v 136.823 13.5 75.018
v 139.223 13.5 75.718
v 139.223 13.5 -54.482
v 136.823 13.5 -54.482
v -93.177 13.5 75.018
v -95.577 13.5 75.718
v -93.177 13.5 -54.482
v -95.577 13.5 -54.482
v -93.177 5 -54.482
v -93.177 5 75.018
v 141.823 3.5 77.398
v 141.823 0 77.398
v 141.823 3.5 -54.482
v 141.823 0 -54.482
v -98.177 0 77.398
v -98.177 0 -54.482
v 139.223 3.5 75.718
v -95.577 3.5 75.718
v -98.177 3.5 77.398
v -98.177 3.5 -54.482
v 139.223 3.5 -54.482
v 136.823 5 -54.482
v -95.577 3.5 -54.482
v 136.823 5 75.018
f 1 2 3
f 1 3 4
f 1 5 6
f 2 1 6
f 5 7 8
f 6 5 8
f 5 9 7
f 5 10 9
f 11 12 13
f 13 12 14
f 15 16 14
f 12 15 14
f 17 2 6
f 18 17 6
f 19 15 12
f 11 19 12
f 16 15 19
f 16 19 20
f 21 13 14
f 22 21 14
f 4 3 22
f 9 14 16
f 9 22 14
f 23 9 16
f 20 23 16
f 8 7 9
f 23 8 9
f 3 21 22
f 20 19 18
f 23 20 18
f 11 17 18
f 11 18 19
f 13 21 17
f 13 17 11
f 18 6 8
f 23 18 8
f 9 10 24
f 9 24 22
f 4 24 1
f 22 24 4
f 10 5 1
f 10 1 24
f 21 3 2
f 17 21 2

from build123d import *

# Parameters (mm, degrees)
SKETCH1_W           = 240
SKETCH1_H           = 351.15
BOSS_EXTRUDE3_DEPTH = 21
SKETCH5_W           = 248.975913499
SKETCH5_H           = 113.170869772
CUT_EXTRUDE5_DEPTH  = 254
CAVITY1_START       = -93.176553254
CAVITY1_DEPTH       = 230
SKETCH6_W           = 230
SKETCH6_H           = 2.384694545
CUT_EXTRUDE6_DEPTH  = 10
SKETCH7_W           = 329.692379319
SKETCH7_H           = 158.801284786
CUT_EXTRUDE8_DEPTH  = 33
CUT_EXTRUDE9_DEPTH  = 10


with BuildPart() as part:
    # Sketch1 → Boss-Extrude3 (new body)
    with BuildSketch(Plane(origin=(0, 0, 0), x_dir=(1, 0, 0), z_dir=(0, 1, 0))):
        with Locations((21.823446746, 98.176553254)):
            Rectangle(SKETCH1_W, SKETCH1_H)
    extrude(amount=BOSS_EXTRUDE3_DEPTH)

    # Sketch5 → Cut-Extrude5 (cut)
    with BuildSketch(Plane(origin=(0, 0, -54.481553254), x_dir=(-1, 0, 0), z_dir=(0, 0, -1))):
        with Locations((-20.8478358, 4.110963623)):
            Rectangle(SKETCH5_W, SKETCH5_H)
    extrude(amount=CUT_EXTRUDE5_DEPTH, mode=Mode.SUBTRACT)

    # Cavity1: read off the stored shape, not the designer's step
    # Cavity1 outline → Cavity1 (cut)
    with BuildSketch(Plane.YZ.offset(CAVITY1_START)):
        Polygon((18.5, 60.403141291), (13.5, 67.518446746), (13.5, 67.903141291), (18.5, 67.903141291), (13.5, 75.018446746), (5, 75.018446746), (5, -54.481553254), (13.5, -54.481553254), (13.5, -52.096858709), (18.5, -52.096858709), (13.5, -44.981553254), (13.5, -44.596858709), (18.5, -44.596858709), (13.5, -37.481553254), (13.5, -37.096858709), (18.5, -37.096858709), (13.5, -29.981553254), (13.5, -29.596858709), (18.5, -29.596858709), (13.5, -22.481553254), (13.5, -22.096858709), (18.5, -22.096858709), (13.5, -14.981553254), (13.5, -14.596858709), (18.5, -14.596858709), (13.5, -7.481553254), (13.5, -7.096858709), (18.5, -7.096858709), (13.5, 0.018446746), (13.5, 0.403141291), (18.5, 0.403141291), (13.5, 7.518446746), (13.5, 7.903141291), (18.5, 7.903141291), (13.5, 15.018446746), (13.5, 15.403141291), (18.5, 15.403141291), (13.5, 22.518446746), (13.5, 22.903141291), (18.5, 22.903141291), (13.5, 30.018446746), (13.5, 30.403141291), (18.5, 30.403141291), (13.5, 37.518446746), (13.5, 37.903141291), (18.5, 37.903141291), (13.5, 45.018446746), (13.5, 45.403141291), (18.5, 45.403141291), (13.5, 52.518446746), (13.5, 52.903141291), (18.5, 52.903141291), (13.5, 60.018446746), (13.5, 60.403141291), align=None)
    extrude(amount=CAVITY1_DEPTH, mode=Mode.SUBTRACT)

    # Sketch6 → Cut-Extrude6 (cut)
    with BuildSketch(Plane(origin=(0, 13.5, 0), x_dir=(-1, 0, 0), z_dir=(0, -1, 0))):
        with Locations((-21.823446746, 53.289205982)):
            Rectangle(SKETCH6_W, SKETCH6_H)
    extrude(amount=-CUT_EXTRUDE6_DEPTH, mode=Mode.SUBTRACT)

    # Sketch7 → Cut-Extrude8 (cut)
    with BuildSketch(Plane(origin=(0, 13.5, 0), x_dir=(-1, 0, 0), z_dir=(0, -1, 0))):
        with Locations((-33.84938791, -12.885366014)):
            Rectangle(SKETCH7_W, SKETCH7_H)
    extrude(amount=-CUT_EXTRUDE8_DEPTH, mode=Mode.SUBTRACT)

    # Sketch9 → Cut-Extrude9 (cut)
    with BuildSketch(Plane(origin=(0, 13.5, 0), x_dir=(1, 0, 0), z_dir=(0, 1, 0))):
        Polygon((139.223446746, 54.481553254), (139.223446746, -75.718446746), (-95.576553254, -75.718446746), (-95.576553254, 54.481553254), (-98.176553254, 54.481553254), (-98.176553254, -77.398446746), (141.823446746, -77.398446746), (141.823446746, 54.481553254), align=None)
    extrude(amount=-CUT_EXTRUDE9_DEPTH, mode=Mode.SUBTRACT)


solid = part.part
